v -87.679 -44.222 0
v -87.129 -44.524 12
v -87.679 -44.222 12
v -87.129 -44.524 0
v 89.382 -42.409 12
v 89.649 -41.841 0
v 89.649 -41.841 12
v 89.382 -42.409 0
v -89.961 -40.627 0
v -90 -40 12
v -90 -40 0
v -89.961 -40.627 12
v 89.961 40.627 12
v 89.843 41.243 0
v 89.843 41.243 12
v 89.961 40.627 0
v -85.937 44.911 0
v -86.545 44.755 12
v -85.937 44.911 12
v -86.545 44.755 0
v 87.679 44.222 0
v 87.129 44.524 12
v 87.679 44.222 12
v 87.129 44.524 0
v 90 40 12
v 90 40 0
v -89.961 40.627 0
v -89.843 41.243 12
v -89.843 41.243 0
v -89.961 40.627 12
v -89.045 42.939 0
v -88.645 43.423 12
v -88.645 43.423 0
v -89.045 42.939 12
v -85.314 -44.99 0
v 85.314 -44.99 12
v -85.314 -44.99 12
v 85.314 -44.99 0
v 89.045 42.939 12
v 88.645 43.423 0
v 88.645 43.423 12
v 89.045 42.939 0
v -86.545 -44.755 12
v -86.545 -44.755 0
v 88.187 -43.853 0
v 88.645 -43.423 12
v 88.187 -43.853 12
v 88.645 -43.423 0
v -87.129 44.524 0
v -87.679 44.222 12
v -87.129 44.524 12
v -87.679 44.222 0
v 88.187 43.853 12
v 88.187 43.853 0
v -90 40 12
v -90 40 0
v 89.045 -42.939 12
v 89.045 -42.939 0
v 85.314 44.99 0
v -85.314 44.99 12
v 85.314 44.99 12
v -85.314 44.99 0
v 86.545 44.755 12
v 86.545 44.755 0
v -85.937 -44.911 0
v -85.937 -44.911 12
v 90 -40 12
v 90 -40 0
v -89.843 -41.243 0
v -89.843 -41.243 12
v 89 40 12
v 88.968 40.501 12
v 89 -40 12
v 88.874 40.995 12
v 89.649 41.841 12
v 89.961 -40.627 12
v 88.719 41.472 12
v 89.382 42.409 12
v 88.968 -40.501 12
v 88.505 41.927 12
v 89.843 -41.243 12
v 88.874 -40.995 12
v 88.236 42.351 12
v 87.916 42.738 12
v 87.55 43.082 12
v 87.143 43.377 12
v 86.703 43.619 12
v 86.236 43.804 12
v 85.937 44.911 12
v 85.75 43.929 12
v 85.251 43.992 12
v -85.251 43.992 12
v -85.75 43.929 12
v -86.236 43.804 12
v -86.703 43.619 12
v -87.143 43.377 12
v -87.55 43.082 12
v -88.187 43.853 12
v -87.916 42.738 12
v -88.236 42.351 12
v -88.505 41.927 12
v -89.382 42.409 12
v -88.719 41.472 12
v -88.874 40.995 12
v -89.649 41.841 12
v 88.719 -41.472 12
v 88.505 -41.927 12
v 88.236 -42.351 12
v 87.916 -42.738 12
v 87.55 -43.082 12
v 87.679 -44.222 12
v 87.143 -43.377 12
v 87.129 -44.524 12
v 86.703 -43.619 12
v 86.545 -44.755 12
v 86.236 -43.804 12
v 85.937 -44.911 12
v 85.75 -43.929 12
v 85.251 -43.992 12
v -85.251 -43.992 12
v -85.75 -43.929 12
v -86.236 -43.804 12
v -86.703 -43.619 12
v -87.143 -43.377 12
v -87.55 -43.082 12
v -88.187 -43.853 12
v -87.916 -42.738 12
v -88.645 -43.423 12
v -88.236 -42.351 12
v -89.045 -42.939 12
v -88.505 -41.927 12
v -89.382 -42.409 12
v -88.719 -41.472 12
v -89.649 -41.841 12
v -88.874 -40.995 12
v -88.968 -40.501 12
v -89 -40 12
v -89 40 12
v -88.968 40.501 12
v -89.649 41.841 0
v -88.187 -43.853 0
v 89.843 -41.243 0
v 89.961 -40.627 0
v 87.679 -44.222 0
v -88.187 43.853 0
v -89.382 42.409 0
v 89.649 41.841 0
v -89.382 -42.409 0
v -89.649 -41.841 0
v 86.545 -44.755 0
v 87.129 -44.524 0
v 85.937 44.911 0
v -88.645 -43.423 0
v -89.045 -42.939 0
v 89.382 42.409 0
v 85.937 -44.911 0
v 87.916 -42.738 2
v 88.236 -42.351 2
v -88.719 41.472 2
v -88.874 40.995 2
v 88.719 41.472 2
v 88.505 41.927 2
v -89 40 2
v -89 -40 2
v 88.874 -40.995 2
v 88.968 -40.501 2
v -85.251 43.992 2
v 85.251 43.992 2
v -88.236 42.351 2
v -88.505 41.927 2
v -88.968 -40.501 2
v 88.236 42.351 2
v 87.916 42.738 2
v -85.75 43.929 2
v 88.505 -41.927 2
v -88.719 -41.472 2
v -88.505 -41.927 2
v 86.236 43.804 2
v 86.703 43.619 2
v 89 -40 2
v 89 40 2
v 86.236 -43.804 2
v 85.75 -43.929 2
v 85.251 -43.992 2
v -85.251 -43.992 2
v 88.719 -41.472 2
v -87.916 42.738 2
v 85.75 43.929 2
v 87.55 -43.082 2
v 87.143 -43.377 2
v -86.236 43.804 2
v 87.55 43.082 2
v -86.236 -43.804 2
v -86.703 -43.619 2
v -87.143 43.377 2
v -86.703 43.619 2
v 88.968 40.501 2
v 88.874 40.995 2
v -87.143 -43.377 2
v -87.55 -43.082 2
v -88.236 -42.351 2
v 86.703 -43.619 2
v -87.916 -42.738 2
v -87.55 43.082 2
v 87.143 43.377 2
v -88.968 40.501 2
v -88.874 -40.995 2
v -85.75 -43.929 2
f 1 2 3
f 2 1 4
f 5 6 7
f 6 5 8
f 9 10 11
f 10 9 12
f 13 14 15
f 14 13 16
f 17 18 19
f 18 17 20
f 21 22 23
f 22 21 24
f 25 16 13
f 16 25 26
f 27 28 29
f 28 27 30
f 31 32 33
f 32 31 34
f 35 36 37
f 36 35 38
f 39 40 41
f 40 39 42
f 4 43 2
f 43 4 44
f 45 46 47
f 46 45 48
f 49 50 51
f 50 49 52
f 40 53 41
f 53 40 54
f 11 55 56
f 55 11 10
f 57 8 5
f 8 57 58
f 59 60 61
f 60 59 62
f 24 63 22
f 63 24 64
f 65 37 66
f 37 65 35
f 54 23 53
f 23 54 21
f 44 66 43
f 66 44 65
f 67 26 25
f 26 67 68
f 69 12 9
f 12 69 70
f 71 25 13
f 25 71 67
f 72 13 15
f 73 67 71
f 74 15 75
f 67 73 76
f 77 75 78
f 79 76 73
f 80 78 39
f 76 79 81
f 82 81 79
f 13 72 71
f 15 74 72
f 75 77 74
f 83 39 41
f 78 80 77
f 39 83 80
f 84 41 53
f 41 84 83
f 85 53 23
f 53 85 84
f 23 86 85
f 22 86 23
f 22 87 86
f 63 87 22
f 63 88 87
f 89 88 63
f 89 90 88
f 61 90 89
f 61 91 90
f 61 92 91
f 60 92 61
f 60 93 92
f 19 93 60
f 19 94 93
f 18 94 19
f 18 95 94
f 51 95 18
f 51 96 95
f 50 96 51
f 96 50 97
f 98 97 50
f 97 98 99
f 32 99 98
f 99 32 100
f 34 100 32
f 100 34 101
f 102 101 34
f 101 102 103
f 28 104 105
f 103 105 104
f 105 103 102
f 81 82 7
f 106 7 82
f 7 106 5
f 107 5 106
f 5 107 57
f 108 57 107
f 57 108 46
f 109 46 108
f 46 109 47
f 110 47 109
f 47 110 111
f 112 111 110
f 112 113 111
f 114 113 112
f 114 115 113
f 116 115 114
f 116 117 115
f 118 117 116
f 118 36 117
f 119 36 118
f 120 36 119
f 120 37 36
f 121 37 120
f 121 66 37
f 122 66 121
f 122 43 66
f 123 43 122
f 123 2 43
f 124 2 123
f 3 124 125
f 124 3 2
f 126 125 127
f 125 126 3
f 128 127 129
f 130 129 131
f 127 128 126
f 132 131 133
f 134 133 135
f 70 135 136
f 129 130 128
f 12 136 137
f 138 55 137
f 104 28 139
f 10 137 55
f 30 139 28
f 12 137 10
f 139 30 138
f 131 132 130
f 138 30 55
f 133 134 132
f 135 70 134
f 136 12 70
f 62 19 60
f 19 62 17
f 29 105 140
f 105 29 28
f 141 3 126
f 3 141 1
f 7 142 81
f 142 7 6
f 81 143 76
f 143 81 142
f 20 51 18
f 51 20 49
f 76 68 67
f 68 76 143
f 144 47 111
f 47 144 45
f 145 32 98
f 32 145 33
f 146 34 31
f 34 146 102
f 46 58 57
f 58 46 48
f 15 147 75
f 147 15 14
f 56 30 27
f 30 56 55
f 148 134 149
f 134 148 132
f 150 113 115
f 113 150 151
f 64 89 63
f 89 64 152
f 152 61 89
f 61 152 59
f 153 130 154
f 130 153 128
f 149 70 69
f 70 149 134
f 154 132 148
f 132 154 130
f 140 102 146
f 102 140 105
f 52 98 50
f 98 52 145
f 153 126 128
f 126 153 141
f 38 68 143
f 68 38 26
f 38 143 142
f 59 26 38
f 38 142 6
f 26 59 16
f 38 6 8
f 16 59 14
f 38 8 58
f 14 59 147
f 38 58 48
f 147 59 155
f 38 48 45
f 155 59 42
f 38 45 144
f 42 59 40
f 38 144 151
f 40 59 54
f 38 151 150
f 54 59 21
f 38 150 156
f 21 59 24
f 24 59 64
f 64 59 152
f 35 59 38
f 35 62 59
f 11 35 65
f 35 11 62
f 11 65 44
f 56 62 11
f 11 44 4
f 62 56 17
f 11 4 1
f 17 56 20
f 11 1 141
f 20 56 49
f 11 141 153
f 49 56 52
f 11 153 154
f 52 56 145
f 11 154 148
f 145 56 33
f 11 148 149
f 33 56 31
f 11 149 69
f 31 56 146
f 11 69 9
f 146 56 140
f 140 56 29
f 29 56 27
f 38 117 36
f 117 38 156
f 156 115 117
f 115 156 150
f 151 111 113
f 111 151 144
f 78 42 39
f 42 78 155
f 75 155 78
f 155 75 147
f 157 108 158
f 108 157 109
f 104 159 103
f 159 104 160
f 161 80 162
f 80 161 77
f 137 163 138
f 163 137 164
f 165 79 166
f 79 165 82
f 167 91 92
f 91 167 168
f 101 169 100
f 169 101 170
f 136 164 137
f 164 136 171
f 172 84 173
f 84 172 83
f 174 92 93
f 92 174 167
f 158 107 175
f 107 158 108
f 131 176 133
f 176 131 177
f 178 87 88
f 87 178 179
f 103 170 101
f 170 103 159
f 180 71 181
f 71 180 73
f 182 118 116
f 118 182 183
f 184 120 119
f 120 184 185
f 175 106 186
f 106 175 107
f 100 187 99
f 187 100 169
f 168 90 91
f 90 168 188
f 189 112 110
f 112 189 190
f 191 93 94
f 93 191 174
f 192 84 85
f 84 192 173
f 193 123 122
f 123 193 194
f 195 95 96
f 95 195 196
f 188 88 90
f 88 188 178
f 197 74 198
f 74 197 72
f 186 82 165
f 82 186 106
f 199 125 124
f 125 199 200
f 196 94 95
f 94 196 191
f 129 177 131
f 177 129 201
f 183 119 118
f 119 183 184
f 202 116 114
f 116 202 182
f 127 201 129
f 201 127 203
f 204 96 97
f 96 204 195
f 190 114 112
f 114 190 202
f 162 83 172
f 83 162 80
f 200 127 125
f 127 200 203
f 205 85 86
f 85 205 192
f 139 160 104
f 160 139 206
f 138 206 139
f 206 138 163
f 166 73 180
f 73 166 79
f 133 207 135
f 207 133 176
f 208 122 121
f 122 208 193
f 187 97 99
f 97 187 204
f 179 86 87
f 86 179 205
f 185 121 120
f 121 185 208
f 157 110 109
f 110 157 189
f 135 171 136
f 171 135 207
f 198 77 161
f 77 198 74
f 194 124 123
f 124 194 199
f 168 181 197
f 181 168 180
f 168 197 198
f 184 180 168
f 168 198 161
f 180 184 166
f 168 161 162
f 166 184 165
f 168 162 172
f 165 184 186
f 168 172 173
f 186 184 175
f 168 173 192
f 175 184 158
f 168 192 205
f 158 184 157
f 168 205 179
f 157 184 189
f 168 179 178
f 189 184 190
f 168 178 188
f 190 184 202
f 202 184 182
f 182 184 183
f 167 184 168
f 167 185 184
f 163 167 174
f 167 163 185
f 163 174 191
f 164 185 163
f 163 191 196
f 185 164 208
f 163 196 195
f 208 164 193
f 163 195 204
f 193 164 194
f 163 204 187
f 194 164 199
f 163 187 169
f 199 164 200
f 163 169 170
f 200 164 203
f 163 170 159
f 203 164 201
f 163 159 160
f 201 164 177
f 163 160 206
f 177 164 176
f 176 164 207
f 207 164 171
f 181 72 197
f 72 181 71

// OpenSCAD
$fn = 50;


difference() {
	union() {
		hull() {
			translate(v = [-85.0000000000, 40.0000000000, 0]) {
				cylinder(h = 12, r = 5);
			}
			translate(v = [85.0000000000, 40.0000000000, 0]) {
				cylinder(h = 12, r = 5);
			}
			translate(v = [-85.0000000000, -40.0000000000, 0]) {
				cylinder(h = 12, r = 5);
			}
			translate(v = [85.0000000000, -40.0000000000, 0]) {
				cylinder(h = 12, r = 5);
			}
		}
	}
	union() {
		translate(v = [0, 0, 2]) {
			hull() {
				translate(v = [-85.0000000000, 40.0000000000, 0]) {
					cylinder(h = 10, r = 4);
				}
				translate(v = [85.0000000000, 40.0000000000, 0]) {
					cylinder(h = 10, r = 4);
				}
				translate(v = [-85.0000000000, -40.0000000000, 0]) {
					cylinder(h = 10, r = 4);
				}
				translate(v = [85.0000000000, -40.0000000000, 0]) {
					cylinder(h = 10, r = 4);
				}
			}
		}
	}
}
